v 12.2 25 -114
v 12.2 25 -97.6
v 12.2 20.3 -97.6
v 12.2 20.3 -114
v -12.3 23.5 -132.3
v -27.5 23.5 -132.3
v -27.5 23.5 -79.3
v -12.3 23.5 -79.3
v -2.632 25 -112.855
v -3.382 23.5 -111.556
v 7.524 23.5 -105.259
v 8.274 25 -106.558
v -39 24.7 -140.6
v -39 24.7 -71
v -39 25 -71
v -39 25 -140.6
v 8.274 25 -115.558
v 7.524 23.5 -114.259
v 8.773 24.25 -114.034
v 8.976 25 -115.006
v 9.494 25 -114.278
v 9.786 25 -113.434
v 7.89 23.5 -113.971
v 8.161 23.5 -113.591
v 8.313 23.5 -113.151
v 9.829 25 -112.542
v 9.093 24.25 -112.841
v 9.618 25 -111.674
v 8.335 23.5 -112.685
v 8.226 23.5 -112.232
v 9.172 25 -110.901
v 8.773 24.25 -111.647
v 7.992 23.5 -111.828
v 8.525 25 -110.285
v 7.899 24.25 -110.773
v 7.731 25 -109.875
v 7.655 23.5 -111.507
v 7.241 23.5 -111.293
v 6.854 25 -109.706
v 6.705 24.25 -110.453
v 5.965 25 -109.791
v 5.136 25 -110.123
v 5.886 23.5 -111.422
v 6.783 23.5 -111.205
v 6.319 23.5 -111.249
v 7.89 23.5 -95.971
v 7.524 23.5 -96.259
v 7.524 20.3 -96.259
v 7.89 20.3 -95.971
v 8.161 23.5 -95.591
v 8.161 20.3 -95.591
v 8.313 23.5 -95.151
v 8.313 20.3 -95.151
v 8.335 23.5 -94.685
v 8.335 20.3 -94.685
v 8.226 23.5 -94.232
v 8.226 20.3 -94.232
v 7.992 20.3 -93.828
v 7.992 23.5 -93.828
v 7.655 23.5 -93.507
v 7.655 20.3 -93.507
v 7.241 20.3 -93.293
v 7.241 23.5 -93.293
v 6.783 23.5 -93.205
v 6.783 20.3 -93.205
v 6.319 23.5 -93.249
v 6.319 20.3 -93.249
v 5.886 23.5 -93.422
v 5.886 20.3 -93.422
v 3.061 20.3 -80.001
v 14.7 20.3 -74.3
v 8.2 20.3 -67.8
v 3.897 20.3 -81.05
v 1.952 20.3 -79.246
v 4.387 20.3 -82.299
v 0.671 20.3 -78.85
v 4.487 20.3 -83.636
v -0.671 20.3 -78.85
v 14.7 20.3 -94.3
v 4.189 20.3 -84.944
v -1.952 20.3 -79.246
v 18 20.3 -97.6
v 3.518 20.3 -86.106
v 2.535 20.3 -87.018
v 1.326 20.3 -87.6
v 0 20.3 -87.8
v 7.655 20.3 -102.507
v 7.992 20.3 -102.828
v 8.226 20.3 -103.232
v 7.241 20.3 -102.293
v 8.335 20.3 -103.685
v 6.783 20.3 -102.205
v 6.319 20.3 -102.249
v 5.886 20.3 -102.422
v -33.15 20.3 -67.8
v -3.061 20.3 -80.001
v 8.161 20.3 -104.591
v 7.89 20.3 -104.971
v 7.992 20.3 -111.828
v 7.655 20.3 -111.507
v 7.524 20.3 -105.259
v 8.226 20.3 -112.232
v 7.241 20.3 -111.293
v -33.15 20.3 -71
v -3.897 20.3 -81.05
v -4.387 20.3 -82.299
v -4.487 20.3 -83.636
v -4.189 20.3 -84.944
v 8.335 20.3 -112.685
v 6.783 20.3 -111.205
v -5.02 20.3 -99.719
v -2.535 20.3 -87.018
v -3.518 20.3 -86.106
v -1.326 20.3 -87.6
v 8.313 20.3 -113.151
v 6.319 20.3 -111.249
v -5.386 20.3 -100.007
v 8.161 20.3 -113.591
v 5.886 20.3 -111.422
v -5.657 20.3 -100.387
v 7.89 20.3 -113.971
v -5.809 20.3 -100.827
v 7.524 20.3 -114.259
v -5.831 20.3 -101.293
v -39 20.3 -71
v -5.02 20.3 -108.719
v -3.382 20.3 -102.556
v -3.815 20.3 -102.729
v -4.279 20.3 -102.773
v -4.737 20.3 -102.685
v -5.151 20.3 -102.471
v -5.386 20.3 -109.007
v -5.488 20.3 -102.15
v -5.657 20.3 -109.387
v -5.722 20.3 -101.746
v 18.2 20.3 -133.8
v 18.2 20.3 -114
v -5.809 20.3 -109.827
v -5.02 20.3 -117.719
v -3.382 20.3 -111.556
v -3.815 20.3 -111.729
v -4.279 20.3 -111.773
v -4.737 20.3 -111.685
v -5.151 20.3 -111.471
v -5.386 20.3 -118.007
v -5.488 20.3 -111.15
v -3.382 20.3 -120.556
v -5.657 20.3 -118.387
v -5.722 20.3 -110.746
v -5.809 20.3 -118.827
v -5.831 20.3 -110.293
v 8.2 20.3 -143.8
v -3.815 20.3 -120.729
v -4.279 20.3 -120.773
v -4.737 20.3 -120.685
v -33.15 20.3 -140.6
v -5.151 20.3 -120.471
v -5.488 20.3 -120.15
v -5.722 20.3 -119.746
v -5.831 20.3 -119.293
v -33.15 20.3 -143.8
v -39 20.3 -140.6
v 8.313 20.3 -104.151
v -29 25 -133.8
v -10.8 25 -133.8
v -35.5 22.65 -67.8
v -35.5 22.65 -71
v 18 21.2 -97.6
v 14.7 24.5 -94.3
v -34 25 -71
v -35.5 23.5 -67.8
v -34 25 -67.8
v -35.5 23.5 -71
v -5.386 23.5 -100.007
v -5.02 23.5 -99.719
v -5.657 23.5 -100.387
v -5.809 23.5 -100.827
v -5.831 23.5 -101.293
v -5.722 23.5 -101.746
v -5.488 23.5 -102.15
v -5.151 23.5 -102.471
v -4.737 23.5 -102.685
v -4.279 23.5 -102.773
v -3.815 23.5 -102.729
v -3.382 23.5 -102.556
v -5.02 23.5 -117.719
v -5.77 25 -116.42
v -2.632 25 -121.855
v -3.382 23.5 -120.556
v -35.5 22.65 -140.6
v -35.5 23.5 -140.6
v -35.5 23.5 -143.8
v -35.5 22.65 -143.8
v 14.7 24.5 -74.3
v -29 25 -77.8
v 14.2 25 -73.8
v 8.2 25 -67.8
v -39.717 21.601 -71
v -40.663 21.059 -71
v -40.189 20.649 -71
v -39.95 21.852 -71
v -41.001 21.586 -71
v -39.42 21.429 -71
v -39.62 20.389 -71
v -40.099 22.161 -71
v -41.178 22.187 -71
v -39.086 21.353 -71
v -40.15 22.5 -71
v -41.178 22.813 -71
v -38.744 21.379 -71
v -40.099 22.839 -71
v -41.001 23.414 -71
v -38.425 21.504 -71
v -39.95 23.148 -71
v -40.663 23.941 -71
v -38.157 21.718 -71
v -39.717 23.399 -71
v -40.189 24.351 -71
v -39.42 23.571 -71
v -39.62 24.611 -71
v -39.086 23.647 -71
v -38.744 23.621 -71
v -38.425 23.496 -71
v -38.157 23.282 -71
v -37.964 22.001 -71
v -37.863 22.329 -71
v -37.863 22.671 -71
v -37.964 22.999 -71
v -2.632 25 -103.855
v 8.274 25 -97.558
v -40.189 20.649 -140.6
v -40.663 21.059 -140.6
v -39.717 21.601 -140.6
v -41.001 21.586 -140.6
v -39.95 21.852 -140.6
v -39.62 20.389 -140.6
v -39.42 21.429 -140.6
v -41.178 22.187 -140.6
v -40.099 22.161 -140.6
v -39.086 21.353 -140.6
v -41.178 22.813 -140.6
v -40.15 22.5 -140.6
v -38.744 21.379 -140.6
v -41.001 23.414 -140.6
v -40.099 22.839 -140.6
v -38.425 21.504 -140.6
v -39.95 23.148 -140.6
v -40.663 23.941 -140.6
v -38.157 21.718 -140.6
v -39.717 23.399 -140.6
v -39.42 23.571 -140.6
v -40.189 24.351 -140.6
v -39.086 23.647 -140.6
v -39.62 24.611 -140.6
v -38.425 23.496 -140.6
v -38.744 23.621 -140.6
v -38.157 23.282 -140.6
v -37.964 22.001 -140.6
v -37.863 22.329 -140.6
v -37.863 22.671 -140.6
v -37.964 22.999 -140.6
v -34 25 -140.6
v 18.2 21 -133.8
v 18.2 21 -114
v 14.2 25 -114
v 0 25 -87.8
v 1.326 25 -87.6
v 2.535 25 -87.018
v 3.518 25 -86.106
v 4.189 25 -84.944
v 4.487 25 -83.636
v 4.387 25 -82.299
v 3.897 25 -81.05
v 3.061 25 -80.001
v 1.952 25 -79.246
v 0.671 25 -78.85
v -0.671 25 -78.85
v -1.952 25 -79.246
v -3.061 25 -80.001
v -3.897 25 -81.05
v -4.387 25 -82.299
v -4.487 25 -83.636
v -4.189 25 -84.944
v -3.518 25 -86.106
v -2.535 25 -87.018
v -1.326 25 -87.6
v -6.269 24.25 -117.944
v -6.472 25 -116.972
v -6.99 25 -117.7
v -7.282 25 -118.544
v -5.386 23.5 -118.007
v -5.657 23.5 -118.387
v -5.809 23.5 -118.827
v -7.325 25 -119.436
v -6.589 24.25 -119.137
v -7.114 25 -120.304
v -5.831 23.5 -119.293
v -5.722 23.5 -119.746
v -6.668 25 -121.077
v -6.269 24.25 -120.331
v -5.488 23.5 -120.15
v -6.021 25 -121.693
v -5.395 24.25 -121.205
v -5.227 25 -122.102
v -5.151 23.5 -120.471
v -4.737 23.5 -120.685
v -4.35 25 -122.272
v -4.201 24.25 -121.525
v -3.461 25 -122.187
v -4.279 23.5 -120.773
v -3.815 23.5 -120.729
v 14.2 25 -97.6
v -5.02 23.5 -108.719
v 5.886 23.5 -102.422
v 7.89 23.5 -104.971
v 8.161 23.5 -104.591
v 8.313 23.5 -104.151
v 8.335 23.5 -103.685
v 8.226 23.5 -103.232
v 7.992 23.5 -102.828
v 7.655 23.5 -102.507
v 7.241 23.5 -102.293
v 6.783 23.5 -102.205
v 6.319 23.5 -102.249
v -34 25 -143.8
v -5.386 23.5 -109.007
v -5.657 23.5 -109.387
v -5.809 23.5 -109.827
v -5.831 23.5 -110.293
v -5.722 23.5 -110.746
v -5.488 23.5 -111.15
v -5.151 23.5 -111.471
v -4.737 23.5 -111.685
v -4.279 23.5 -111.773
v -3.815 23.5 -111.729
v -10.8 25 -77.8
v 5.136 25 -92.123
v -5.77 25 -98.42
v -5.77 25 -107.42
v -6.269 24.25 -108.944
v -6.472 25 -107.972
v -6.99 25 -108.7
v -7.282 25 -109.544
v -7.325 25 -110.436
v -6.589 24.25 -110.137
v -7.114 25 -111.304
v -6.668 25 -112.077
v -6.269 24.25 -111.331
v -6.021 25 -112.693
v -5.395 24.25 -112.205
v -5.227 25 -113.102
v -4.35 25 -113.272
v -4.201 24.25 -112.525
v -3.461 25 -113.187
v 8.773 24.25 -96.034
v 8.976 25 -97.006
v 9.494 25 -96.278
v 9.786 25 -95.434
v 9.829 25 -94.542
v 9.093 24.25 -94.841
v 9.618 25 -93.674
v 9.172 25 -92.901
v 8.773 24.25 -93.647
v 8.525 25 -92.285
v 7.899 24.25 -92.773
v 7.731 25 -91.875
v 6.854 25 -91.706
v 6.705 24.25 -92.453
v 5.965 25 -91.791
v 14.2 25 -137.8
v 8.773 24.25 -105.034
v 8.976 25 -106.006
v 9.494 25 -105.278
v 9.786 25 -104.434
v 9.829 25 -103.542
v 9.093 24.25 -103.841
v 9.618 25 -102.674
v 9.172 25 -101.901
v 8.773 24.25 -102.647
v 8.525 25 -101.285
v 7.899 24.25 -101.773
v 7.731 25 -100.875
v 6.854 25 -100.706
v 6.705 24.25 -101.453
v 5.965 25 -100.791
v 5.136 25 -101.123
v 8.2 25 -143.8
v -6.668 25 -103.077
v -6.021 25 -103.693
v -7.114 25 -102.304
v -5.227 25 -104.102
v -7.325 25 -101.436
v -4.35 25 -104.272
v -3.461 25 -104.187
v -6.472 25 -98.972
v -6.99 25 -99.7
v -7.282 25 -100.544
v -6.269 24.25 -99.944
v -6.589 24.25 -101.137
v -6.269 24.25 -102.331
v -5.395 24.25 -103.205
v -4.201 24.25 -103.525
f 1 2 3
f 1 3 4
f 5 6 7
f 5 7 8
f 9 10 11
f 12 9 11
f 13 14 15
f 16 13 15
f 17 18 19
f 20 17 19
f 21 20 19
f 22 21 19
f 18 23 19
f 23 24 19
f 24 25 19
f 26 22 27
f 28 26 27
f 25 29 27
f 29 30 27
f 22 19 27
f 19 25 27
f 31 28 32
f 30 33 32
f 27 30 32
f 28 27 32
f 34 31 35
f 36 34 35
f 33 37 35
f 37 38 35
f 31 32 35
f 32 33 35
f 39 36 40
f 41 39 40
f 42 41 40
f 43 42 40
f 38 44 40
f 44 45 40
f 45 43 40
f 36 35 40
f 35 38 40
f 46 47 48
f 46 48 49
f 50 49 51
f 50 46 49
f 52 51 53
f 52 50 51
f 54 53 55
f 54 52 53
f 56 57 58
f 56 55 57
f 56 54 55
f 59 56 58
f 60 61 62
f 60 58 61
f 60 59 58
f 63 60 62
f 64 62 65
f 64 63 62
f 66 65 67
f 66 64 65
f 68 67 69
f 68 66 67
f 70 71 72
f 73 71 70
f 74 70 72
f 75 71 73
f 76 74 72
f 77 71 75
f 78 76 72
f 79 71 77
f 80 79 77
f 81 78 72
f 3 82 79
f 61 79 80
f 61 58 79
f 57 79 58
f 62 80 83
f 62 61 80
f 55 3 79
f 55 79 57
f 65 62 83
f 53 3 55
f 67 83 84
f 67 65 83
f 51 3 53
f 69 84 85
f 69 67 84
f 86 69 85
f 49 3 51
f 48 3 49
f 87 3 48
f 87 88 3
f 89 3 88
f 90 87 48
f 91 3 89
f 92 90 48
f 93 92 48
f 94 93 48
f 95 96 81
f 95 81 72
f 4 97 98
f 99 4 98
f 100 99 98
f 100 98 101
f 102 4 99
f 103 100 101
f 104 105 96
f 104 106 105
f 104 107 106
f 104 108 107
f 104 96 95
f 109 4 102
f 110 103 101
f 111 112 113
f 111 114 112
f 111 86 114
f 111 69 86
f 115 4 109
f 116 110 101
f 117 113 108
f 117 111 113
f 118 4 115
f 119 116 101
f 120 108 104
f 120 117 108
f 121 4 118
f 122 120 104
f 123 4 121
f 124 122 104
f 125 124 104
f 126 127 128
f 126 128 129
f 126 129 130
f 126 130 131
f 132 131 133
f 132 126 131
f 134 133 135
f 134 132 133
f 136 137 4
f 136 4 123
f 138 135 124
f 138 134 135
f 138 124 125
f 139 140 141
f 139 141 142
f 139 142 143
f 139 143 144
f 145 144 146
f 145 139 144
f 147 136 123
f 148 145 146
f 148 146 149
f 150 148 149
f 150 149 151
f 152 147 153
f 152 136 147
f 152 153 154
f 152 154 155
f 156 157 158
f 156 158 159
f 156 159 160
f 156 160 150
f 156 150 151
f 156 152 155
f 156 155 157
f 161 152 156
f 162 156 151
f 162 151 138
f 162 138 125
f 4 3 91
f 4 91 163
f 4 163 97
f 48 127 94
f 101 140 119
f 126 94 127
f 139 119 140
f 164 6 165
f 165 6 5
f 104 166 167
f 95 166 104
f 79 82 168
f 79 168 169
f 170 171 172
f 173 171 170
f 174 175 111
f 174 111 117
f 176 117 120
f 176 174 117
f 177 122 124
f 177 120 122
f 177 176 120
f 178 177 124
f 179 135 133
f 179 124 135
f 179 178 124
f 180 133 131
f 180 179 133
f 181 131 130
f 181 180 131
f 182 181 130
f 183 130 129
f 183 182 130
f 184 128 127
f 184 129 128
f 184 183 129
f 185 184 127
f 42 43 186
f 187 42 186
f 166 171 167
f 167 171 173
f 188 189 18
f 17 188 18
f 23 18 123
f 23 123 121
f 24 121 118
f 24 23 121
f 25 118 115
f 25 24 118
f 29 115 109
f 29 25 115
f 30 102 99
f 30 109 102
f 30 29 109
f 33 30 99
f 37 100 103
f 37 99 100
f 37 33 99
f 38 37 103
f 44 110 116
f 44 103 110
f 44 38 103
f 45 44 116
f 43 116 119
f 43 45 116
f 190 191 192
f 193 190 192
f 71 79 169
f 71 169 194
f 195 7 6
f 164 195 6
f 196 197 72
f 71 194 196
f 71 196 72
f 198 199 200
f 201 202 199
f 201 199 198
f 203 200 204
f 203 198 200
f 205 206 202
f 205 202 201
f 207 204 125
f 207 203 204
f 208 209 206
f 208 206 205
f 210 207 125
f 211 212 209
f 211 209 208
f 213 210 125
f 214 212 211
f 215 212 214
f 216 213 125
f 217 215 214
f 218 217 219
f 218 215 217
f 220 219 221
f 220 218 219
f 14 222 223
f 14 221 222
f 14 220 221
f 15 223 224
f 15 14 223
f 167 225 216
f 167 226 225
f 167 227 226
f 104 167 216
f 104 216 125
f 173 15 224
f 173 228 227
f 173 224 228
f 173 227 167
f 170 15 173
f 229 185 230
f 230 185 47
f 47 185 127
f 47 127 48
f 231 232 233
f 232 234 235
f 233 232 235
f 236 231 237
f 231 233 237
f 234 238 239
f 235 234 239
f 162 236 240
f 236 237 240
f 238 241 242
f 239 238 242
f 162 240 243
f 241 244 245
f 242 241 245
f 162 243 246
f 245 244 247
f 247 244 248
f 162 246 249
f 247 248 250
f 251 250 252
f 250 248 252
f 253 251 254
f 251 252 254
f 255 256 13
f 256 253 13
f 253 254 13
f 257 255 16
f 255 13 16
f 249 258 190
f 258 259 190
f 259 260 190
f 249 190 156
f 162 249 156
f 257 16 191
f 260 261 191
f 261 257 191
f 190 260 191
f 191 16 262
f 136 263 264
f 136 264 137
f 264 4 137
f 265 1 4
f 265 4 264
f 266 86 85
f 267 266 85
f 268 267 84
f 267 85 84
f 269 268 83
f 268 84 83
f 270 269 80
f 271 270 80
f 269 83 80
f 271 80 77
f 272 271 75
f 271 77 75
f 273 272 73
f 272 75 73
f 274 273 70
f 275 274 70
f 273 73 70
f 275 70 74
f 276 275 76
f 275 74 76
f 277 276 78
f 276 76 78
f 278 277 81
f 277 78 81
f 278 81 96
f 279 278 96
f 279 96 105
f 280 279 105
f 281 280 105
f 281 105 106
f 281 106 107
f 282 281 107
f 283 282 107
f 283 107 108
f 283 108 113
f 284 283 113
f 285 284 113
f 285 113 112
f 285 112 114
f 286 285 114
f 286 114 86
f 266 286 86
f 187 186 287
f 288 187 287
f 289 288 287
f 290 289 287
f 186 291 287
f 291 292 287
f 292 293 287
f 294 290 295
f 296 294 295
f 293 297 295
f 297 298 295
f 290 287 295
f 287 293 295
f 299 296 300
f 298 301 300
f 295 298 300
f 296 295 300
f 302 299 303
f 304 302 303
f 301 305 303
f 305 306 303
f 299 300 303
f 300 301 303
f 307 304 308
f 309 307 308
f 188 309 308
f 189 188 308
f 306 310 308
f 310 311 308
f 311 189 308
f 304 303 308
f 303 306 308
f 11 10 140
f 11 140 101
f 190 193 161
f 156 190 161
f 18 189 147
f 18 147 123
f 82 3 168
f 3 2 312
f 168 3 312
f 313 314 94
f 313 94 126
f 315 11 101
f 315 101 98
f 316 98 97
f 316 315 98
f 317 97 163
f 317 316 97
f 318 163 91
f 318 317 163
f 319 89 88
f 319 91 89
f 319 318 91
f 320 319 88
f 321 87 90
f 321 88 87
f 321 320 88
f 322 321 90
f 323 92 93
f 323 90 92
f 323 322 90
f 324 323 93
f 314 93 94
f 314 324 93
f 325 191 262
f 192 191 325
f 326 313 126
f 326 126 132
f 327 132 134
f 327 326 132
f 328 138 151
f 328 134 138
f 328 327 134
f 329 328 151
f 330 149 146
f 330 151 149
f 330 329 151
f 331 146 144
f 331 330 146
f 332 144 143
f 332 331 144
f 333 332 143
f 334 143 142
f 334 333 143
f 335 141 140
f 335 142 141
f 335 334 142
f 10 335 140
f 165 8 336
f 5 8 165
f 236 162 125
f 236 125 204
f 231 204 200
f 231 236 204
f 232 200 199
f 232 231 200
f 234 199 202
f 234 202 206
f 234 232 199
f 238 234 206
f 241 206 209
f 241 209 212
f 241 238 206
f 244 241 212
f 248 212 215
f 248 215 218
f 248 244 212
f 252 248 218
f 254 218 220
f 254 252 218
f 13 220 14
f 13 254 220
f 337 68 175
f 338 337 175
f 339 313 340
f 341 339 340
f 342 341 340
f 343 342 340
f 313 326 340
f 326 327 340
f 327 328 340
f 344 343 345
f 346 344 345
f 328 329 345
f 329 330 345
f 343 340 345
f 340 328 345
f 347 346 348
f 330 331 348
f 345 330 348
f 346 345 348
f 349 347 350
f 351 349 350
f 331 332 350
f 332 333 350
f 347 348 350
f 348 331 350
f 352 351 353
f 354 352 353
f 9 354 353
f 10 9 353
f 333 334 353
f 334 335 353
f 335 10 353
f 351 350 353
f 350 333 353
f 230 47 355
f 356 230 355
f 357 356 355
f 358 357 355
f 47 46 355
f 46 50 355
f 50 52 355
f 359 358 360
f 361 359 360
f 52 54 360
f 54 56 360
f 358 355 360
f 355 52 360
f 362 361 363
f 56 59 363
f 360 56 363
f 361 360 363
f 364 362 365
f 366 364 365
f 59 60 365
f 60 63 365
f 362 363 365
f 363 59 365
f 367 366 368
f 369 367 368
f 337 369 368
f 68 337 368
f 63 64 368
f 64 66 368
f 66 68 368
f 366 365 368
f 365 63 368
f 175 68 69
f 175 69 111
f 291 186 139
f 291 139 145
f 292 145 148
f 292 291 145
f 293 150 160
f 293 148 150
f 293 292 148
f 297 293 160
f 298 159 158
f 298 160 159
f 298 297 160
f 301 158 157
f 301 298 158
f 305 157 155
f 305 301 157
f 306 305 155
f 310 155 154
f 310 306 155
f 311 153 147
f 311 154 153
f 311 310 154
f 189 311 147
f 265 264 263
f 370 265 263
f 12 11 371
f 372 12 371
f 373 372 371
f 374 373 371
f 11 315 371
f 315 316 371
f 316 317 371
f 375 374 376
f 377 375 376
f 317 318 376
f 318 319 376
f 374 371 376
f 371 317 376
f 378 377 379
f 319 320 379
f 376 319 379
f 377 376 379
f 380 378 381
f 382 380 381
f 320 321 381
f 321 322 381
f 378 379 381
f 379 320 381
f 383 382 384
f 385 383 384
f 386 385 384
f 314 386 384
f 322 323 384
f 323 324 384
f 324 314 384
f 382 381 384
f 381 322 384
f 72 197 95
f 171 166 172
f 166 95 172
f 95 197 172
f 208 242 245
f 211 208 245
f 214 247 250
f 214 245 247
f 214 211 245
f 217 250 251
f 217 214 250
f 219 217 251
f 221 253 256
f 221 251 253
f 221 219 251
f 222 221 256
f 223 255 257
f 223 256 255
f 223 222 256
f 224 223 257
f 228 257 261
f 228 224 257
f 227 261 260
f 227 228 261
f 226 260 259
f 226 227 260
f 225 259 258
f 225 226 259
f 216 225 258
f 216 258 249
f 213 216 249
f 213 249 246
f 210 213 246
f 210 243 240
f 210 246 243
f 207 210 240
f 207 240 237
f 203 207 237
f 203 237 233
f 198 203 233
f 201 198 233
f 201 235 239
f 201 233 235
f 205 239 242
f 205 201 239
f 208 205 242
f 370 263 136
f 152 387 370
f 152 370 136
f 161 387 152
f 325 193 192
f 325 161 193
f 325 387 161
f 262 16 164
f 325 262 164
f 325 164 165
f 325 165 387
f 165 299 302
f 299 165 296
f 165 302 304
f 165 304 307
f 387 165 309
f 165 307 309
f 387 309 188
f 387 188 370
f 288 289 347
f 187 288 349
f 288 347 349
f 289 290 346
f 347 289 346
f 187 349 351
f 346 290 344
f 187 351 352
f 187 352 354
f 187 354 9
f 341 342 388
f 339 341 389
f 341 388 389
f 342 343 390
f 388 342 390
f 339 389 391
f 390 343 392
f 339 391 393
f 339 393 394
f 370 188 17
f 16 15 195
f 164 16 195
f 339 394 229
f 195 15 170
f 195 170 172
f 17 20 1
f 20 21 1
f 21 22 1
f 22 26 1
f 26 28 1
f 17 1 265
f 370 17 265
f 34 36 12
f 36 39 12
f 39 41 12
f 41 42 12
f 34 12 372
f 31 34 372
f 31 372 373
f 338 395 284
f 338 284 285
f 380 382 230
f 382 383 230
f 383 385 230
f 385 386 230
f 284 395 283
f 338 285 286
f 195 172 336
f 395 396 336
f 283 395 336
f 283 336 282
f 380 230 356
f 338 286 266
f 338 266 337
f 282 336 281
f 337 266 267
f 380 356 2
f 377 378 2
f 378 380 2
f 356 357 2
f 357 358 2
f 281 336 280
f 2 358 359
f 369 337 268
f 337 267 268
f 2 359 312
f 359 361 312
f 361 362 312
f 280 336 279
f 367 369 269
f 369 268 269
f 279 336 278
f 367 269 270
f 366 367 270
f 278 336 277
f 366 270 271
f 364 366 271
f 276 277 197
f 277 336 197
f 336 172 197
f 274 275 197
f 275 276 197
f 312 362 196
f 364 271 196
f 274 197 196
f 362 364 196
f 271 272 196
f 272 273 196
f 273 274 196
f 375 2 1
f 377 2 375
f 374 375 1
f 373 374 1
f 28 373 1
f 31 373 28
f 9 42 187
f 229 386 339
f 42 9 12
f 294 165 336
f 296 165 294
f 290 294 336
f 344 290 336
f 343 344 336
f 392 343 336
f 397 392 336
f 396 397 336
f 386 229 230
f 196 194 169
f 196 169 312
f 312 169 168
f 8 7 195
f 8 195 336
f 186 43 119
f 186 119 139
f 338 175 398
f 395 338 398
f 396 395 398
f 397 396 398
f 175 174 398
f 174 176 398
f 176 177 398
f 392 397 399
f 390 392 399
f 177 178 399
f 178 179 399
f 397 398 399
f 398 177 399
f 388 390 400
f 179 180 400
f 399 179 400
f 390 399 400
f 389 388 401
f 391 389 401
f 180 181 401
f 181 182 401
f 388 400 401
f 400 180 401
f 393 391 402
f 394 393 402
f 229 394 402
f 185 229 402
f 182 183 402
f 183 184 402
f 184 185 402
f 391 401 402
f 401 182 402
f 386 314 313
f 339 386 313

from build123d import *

# Parameters (mm, degrees)
BOSS_EXTRUDE1_START         = 10
SKETCH1_R                   = 1.15
BOSS_EXTRUDE1_DEPTH         = 76
SKETCH2_W                   = 6
SKETCH2_H                   = 16.4
CUT_EXTRUDE1_DEPTH          = 76
BOSS_EXTRUDE2_START         = -22
BOSS_EXTRUDE2_DEPTH         = 22
BOSS_EXTRUDE2_2_DEPTH       = 2
BOSS_EXTRUDE2_3_OUTLINE_W   = 6
BOSS_EXTRUDE2_3_OUTLINE_H   = 16
BOSS_EXTRUDE2_3_OUTLINE_W_2 = 5
BOSS_EXTRUDE2_3_OUTLINE_H_2 = 3
BOSS_EXTRUDE2_3_DEPTH       = 5
BOSS_EXTRUDE2_START_2       = -51.8
BOSS_EXTRUDE2_4_DEPTH       = 67
BOSS_EXTRUDE2_START_3       = -59
BOSS_EXTRUDE2_5_OUTLINE_R   = 1.15
BOSS_EXTRUDE2_5_DEPTH       = 78
CHAMFER1_SIZE               = 10
CHAMFER2_SIZE               = 4
CHAMFER3_SIZE               = 4
SKETCH4_W                   = 6
SKETCH4_H                   = 3.2
CUT_EXTRUDE2_DEPTH          = 17
CUT_EXTRUDE4_DEPTH          = 30
CUT_EXTRUDE4_DEPTH_BACK     = 41
SKETCH5_W                   = 96.095535807
SKETCH5_H                   = 97.903785136
SKETCH6_W                   = 65.908561939
SKETCH6_H                   = 2.295323053
CUT_EXTRUDE5_DEPTH          = 108
CUT_EXTRUDE6_DEPTH          = 108
SKETCH9_W                   = 18.2
SKETCH9_H                   = 56
CUT_EXTRUDE8_DEPTH          = 1.5
CUT_EXTRUDE9_DEPTH          = 13.5
CHAMFER4_SIZE               = 1.5
CHAMFER5_SIZE               = 1.5
CUT_EXTRUDE10_DEPTH         = 3.2
CUT_EXTRUDE11_DEPTH         = 3.2
CHAMFER6_SIZE               = 1.5
CUT_EXTRUDE12_DEPTH         = 26
SKETCH15_R                  = 4.5
CUT_EXTRUDE13_DEPTH         = 12


with BuildPart() as part:
    # Sketch1 → Boss-Extrude1 (new body)
    with BuildSketch(Plane(origin=(0, 0, -57.8), x_dir=(-1, 0, 0), z_dir=(0, 0, -1)).offset(BOSS_EXTRUDE1_START)):
        with BuildLine():
            Line((39, 25), (-18.2, 25))
            Line((-18.2, 25), (-18.2, 20))
            Line((-18.2, 20), (39, 20))
            ThreePointArc((39, 20), (41.5, 22.5), (39, 25))
        make_face()
        with Locations((39, 22.5)):
            Circle(SKETCH1_R, mode=Mode.SUBTRACT)
    extrude(amount=BOSS_EXTRUDE1_DEPTH)

    # Sketch2 → Cut-Extrude1 (cut)
    with BuildSketch(Plane(origin=(0, 25, 0), x_dir=(1, 0, 0), z_dir=(0, 1, 0))):
        with Locations((15.2, 105.8)):
            Rectangle(SKETCH2_W, SKETCH2_H)
    extrude(amount=-CUT_EXTRUDE1_DEPTH, mode=Mode.SUBTRACT)

    # Chamfer1
    chamfer1_edges = [part.edges().sort_by_distance(p)[0] for p in [
        (18.2, 22.5, -143.8),
        (18.2, 22.5, -67.8),
    ]]
    chamfer(chamfer1_edges, length=CHAMFER1_SIZE)

    # Chamfer2
    chamfer2_edges = [part.edges().sort_by_distance(p)[0] for p in [
        (18.2, 25, -87.7),
        (18.2, 25, -123.9),
    ]]
    chamfer(chamfer2_edges, length=CHAMFER2_SIZE)

    # Sketch4 → Cut-Extrude2 (cut)
    with BuildSketch(Plane(origin=(0, 25, 0), x_dir=(1, 0, 0), z_dir=(0, 1, 0))):
        with Locations((-38.5, 69.4)):
            Rectangle(SKETCH4_W, SKETCH4_H)
        with Locations((-38.5, 142.2)):
            Rectangle(SKETCH4_W, SKETCH4_H)
    extrude(amount=-CUT_EXTRUDE2_DEPTH, mode=Mode.SUBTRACT)

    # Sketch6 → Cut-Extrude5 (cut)
    with BuildSketch(Plane(origin=(0, 0, -143.8), x_dir=(-1, 0, 0), z_dir=(0, 0, -1))):
        with Locations((13.043955502, 19.152338474)):
            Rectangle(SKETCH6_W, SKETCH6_H)
    extrude(amount=-CUT_EXTRUDE5_DEPTH, mode=Mode.SUBTRACT)

    # Sketch7 → Cut-Extrude6 (cut)
    with BuildSketch(Plane(origin=(0, 0, -140.6), x_dir=(-1, 0, 0), z_dir=(0, 0, -1))):
        with BuildLine():
            Line((39, 24.7), (39, 27.795668708))
            Line((39, 27.795668708), (44.096773439, 22.698895269))
            Line((44.096773439, 22.698895269), (43.273657472, 20.3))
            Line((43.273657472, 20.3), (39, 20.3))
            ThreePointArc((39, 20.3), (41.2, 22.5), (39, 24.7))
        make_face()
    extrude(amount=-CUT_EXTRUDE6_DEPTH, mode=Mode.SUBTRACT)

    # Sketch9 → Cut-Extrude8 (cut)
    with BuildSketch(Plane(origin=(0, 25, 0), x_dir=(1, 0, 0), z_dir=(0, 1, 0))):
        with Locations((-19.9, 105.8)):
            Rectangle(SKETCH9_W, SKETCH9_H)
    extrude(amount=-CUT_EXTRUDE8_DEPTH, mode=Mode.SUBTRACT)

    # Sketch11 → Cut-Extrude9 (cut)
    with BuildSketch(Plane(origin=(0, 25, 0), x_dir=(1, 0, 0), z_dir=(0, 1, 0))):
        with BuildLine():
            Line((-3.382273892, 102.55565443), (7.524013646, 96.258906385))
            ThreePointArc((7.524013646, 96.258906385), (8.123454363, 94.021763172), (5.886311151, 93.422322455))
            Line((5.886311151, 93.422322455), (-5.019976387, 99.719070501))
            ThreePointArc((-5.019976387, 99.719070501), (-5.619417104, 101.956213713), (-3.382273892, 102.55565443))
        make_face()
        with BuildLine():
            Line((-3.382273892, 111.55565443), (7.524013646, 105.258906385))
            ThreePointArc((7.524013646, 105.258906385), (8.123454363, 103.021763172), (5.886311151, 102.422322455))
            Line((5.886311151, 102.422322455), (-5.019976387, 108.719070501))
            ThreePointArc((-5.019976387, 108.719070501), (-5.619417104, 110.956213713), (-3.382273892, 111.55565443))
        make_face()
        with BuildLine():
            Line((-3.382273892, 120.55565443), (7.524013646, 114.258906385))
            ThreePointArc((7.524013646, 114.258906385), (8.123454363, 112.021763172), (5.886311151, 111.422322455))
            Line((5.886311151, 111.422322455), (-5.019976387, 117.719070501))
            ThreePointArc((-5.019976387, 117.719070501), (-5.619417104, 119.956213713), (-3.382273892, 120.55565443))
        make_face()
    extrude(amount=-CUT_EXTRUDE9_DEPTH, mode=Mode.SUBTRACT)

    # Chamfer4
    chamfer4_edges = [part.edges().sort_by_distance(p)[0] for p in [
        (-19.9, 23.5, -133.8),
        (-10.8, 23.5, -105.8),
        (-19.9, 23.5, -77.8),
        (-29, 23.5, -105.8),
    ]]
    chamfer(chamfer4_edges, length=CHAMFER4_SIZE - 0.0001)  # a hair under: the kernel refuses the full size

    # Chamfer5
    chamfer5_edges = [part.edges().sort_by_distance(p)[0] for p in [
        (-5.619417104, 25, -110.956213713),
        (0.433167382, 25, -105.570696478),
        (8.123454363, 25, -103.021763172),
        (2.070869877, 25, -108.407280407),
        (-5.619417104, 25, -119.956213713),
        (0.433167382, 25, -114.570696478),
        (8.123454363, 25, -112.021763172),
        (2.070869877, 25, -117.407280407),
        (-5.619417104, 25, -101.956213713),
        (0.433167382, 25, -96.570696478),
        (8.123454363, 25, -94.021763172),
        (2.070869877, 25, -99.407280407),
    ]]
    chamfer(chamfer5_edges, length=CHAMFER5_SIZE)

    # Sketch12 → Cut-Extrude10 (cut)
    with BuildSketch(Plane(origin=(0, 0, -143.8), x_dir=(-1, 0, 0), z_dir=(0, 0, -1))):
        Polygon((35.5, 22.65), (33.15, 20.3), (34.627405096, 18.349875441), (37.777251213, 19.324937721), align=None)
    extrude(amount=-CUT_EXTRUDE10_DEPTH, mode=Mode.SUBTRACT)

    # Sketch13 → Cut-Extrude11 (cut)
    with BuildSketch(Plane.XY.offset(-67.8)):
        Polygon((-35.5, 22.65), (-33.15, 20.3), (-32.556705416, 17.347754732), (-36.536239956, 18.083750154), align=None)
    extrude(amount=-CUT_EXTRUDE11_DEPTH, mode=Mode.SUBTRACT)

    # Chamfer6
    chamfer6_edges = [part.edges().sort_by_distance(p)[0] for p in [
        (-35.5, 25, -69.4),
        (-35.5, 25, -142.2),
    ]]
    chamfer(chamfer6_edges, length=CHAMFER6_SIZE)

    # Sketch14 → Cut-Extrude12 (cut)
    with BuildSketch(Plane.XZ.offset(-20.3)):
        Polygon((18.2, -97.8), (14.7, -94.3), (14.7, -71.715249411), (21.506629366, -77.723703215), (19.139662716, -97.460563588), align=None)
    extrude(amount=-CUT_EXTRUDE12_DEPTH, mode=Mode.SUBTRACT)

    # Sketch15 → Cut-Extrude13 (cut)
    with BuildSketch(Plane.XZ.offset(-20.3)):
        with Locations(Location((0, -83.3, 0), (0, 0, 270))):
            Circle(SKETCH15_R)
    extrude(amount=-CUT_EXTRUDE13_DEPTH, mode=Mode.SUBTRACT)


with BuildPart() as body_2:
    # Boss-Extrude2: read off the stored shape, not the designer's step
    # Boss-Extrude2 outline → Boss-Extrude2 (new body)
    with BuildSketch(Plane(origin=(0, 20, 0), x_dir=(1, 0, 0), z_dir=(0, 1, 0)).offset(BOSS_EXTRUDE2_START)):
        Polygon((18.2, 47.8), (8.2, 57.8), (-41.5, 57.8), (-41.5, -18.2), (8.2, -18.2), (18.2, -8.2), align=None)
        with BuildLine():
            Line((-20, -15.2), (-38.5, -15.2))
            Line((-38.5, -15.2), (-38.5, 54.8))
            Line((-38.5, 54.8), (1.49684114, 54.8))
            Line((1.49684114, 54.8), (1.49684114, 39.499999909))
            Line((1.49684114, 39.499999909), (11.34684114, 39.499999909))
            Line((11.34684114, 39.499999909), (11.34684114, 10.113812147))
            ThreePointArc((11.34684114, 10.113812147), (0.0047491, -15.199999258), (-11.35315886, 10.10671974))
            Line((-11.35315886, 10.10671974), (-11.35315886, 39.499999909))
            Line((-11.35315886, 39.499999909), (-1.50315886, 39.499999909))
            Line((-1.50315886, 39.499999909), (-1.50315886, 51.8))
            Line((-1.50315886, 51.8), (-20, 51.8))
            Line((-20, 51.8), (-20, -15.2))
        make_face(mode=Mode.SUBTRACT)
    extrude(amount=BOSS_EXTRUDE2_DEPTH)

    # Boss-Extrude2 2 outline → Boss-Extrude2 2 (add)
    with BuildSketch(Plane(origin=(0, 20, 0), x_dir=(1, 0, 0), z_dir=(0, 1, 0)).offset(BOSS_EXTRUDE2_START)):
        with BuildLine():
            Line((1.49684114, 54.8), (-38.5, 54.8))
            Line((-38.5, 54.8), (-38.5, -15.2))
            Line((-38.5, -15.2), (-20, -15.2))
            Line((-20, -15.2), (-20, 51.8))
            Line((-20, 51.8), (-1.50315886, 51.8))
            Line((-1.50315886, 51.8), (-1.50315886, 39.499999909))
            Line((-1.50315886, 39.499999909), (-11.35315886, 39.499999909))
            Line((-11.35315886, 39.499999909), (-11.35315886, 10.10671974))
            ThreePointArc((-11.35315886, 10.10671974), (0.0047491, -15.199999258), (11.34684114, 10.113812147))
            Line((11.34684114, 10.113812147), (11.34684114, 39.499999909))
            Line((11.34684114, 39.499999909), (1.49684114, 39.499999909))
            Line((1.49684114, 39.499999909), (1.49684114, 54.8))
        make_face()
    extrude(amount=BOSS_EXTRUDE2_2_DEPTH)

    # Boss-Extrude2 3 outline → Boss-Extrude2 3 (add)
    with BuildSketch(Plane(origin=(0, 20, 0), x_dir=(1, 0, 0), z_dir=(0, 1, 0))):
        with Locations((15.2, 19.8)):
            Rectangle(BOSS_EXTRUDE2_3_OUTLINE_W, BOSS_EXTRUDE2_3_OUTLINE_H)
        with Locations((-39, 56.3)):
            Rectangle(BOSS_EXTRUDE2_3_OUTLINE_W_2, BOSS_EXTRUDE2_3_OUTLINE_H_2)
        with Locations((-39, -16.7)):
            Rectangle(BOSS_EXTRUDE2_3_OUTLINE_W_2, BOSS_EXTRUDE2_3_OUTLINE_H_2)
    extrude(amount=BOSS_EXTRUDE2_3_DEPTH)

    # Boss-Extrude2 4 outline → Boss-Extrude2 4 (cut)
    with BuildSketch(Plane.XY.offset(BOSS_EXTRUDE2_START_2)):
        Polygon((-20, 15.5), (-15.5, 20), (-20, 20), align=None)
    extrude(amount=BOSS_EXTRUDE2_4_DEPTH, mode=Mode.SUBTRACT)

    # Boss-Extrude2 5 outline → Boss-Extrude2 5 (cut)
    with BuildSketch(Plane.XY.offset(BOSS_EXTRUDE2_START_3)):
        with BuildLine():
            ThreePointArc((-41.5, 23), (-40.914213562, 24.414213562), (-39.5, 25))
            Line((-39.5, 25), (-41.5, 25))
            Line((-41.5, 25), (-41.5, 23))
        make_face()
        with BuildLine():
            ThreePointArc((-38.5, 25), (-37.085786438, 24.414213562), (-36.5, 23))
            Line((-36.5, 23), (-36.5, 25))
            Line((-36.5, 25), (-38.5, 25))
        make_face()
        with Locations((-39, 22.5)):
            Circle(BOSS_EXTRUDE2_5_OUTLINE_R)
    extrude(amount=BOSS_EXTRUDE2_5_DEPTH, mode=Mode.SUBTRACT)

    # Chamfer3
    chamfer3_edges = [body_2.edges().sort_by_distance(p)[0] for p in [
        (18.2, 25, -19.8),
    ]]
    chamfer(chamfer3_edges, length=CHAMFER3_SIZE)

    # Sketch5 → Cut-Extrude4 (cut, two sides: drawn at the far end of the back side and taken through both)
    with BuildSketch(Plane(origin=(0, 25, 0), x_dir=(1, 0, 0), z_dir=(0, 1, 0)).offset(-CUT_EXTRUDE4_DEPTH_BACK)):
        with Locations((-8.937626006, 13.848107432)):
            Rectangle(SKETCH5_W, SKETCH5_H)
    extrude(amount=CUT_EXTRUDE4_DEPTH + CUT_EXTRUDE4_DEPTH_BACK, mode=Mode.SUBTRACT)


solid = part.part
